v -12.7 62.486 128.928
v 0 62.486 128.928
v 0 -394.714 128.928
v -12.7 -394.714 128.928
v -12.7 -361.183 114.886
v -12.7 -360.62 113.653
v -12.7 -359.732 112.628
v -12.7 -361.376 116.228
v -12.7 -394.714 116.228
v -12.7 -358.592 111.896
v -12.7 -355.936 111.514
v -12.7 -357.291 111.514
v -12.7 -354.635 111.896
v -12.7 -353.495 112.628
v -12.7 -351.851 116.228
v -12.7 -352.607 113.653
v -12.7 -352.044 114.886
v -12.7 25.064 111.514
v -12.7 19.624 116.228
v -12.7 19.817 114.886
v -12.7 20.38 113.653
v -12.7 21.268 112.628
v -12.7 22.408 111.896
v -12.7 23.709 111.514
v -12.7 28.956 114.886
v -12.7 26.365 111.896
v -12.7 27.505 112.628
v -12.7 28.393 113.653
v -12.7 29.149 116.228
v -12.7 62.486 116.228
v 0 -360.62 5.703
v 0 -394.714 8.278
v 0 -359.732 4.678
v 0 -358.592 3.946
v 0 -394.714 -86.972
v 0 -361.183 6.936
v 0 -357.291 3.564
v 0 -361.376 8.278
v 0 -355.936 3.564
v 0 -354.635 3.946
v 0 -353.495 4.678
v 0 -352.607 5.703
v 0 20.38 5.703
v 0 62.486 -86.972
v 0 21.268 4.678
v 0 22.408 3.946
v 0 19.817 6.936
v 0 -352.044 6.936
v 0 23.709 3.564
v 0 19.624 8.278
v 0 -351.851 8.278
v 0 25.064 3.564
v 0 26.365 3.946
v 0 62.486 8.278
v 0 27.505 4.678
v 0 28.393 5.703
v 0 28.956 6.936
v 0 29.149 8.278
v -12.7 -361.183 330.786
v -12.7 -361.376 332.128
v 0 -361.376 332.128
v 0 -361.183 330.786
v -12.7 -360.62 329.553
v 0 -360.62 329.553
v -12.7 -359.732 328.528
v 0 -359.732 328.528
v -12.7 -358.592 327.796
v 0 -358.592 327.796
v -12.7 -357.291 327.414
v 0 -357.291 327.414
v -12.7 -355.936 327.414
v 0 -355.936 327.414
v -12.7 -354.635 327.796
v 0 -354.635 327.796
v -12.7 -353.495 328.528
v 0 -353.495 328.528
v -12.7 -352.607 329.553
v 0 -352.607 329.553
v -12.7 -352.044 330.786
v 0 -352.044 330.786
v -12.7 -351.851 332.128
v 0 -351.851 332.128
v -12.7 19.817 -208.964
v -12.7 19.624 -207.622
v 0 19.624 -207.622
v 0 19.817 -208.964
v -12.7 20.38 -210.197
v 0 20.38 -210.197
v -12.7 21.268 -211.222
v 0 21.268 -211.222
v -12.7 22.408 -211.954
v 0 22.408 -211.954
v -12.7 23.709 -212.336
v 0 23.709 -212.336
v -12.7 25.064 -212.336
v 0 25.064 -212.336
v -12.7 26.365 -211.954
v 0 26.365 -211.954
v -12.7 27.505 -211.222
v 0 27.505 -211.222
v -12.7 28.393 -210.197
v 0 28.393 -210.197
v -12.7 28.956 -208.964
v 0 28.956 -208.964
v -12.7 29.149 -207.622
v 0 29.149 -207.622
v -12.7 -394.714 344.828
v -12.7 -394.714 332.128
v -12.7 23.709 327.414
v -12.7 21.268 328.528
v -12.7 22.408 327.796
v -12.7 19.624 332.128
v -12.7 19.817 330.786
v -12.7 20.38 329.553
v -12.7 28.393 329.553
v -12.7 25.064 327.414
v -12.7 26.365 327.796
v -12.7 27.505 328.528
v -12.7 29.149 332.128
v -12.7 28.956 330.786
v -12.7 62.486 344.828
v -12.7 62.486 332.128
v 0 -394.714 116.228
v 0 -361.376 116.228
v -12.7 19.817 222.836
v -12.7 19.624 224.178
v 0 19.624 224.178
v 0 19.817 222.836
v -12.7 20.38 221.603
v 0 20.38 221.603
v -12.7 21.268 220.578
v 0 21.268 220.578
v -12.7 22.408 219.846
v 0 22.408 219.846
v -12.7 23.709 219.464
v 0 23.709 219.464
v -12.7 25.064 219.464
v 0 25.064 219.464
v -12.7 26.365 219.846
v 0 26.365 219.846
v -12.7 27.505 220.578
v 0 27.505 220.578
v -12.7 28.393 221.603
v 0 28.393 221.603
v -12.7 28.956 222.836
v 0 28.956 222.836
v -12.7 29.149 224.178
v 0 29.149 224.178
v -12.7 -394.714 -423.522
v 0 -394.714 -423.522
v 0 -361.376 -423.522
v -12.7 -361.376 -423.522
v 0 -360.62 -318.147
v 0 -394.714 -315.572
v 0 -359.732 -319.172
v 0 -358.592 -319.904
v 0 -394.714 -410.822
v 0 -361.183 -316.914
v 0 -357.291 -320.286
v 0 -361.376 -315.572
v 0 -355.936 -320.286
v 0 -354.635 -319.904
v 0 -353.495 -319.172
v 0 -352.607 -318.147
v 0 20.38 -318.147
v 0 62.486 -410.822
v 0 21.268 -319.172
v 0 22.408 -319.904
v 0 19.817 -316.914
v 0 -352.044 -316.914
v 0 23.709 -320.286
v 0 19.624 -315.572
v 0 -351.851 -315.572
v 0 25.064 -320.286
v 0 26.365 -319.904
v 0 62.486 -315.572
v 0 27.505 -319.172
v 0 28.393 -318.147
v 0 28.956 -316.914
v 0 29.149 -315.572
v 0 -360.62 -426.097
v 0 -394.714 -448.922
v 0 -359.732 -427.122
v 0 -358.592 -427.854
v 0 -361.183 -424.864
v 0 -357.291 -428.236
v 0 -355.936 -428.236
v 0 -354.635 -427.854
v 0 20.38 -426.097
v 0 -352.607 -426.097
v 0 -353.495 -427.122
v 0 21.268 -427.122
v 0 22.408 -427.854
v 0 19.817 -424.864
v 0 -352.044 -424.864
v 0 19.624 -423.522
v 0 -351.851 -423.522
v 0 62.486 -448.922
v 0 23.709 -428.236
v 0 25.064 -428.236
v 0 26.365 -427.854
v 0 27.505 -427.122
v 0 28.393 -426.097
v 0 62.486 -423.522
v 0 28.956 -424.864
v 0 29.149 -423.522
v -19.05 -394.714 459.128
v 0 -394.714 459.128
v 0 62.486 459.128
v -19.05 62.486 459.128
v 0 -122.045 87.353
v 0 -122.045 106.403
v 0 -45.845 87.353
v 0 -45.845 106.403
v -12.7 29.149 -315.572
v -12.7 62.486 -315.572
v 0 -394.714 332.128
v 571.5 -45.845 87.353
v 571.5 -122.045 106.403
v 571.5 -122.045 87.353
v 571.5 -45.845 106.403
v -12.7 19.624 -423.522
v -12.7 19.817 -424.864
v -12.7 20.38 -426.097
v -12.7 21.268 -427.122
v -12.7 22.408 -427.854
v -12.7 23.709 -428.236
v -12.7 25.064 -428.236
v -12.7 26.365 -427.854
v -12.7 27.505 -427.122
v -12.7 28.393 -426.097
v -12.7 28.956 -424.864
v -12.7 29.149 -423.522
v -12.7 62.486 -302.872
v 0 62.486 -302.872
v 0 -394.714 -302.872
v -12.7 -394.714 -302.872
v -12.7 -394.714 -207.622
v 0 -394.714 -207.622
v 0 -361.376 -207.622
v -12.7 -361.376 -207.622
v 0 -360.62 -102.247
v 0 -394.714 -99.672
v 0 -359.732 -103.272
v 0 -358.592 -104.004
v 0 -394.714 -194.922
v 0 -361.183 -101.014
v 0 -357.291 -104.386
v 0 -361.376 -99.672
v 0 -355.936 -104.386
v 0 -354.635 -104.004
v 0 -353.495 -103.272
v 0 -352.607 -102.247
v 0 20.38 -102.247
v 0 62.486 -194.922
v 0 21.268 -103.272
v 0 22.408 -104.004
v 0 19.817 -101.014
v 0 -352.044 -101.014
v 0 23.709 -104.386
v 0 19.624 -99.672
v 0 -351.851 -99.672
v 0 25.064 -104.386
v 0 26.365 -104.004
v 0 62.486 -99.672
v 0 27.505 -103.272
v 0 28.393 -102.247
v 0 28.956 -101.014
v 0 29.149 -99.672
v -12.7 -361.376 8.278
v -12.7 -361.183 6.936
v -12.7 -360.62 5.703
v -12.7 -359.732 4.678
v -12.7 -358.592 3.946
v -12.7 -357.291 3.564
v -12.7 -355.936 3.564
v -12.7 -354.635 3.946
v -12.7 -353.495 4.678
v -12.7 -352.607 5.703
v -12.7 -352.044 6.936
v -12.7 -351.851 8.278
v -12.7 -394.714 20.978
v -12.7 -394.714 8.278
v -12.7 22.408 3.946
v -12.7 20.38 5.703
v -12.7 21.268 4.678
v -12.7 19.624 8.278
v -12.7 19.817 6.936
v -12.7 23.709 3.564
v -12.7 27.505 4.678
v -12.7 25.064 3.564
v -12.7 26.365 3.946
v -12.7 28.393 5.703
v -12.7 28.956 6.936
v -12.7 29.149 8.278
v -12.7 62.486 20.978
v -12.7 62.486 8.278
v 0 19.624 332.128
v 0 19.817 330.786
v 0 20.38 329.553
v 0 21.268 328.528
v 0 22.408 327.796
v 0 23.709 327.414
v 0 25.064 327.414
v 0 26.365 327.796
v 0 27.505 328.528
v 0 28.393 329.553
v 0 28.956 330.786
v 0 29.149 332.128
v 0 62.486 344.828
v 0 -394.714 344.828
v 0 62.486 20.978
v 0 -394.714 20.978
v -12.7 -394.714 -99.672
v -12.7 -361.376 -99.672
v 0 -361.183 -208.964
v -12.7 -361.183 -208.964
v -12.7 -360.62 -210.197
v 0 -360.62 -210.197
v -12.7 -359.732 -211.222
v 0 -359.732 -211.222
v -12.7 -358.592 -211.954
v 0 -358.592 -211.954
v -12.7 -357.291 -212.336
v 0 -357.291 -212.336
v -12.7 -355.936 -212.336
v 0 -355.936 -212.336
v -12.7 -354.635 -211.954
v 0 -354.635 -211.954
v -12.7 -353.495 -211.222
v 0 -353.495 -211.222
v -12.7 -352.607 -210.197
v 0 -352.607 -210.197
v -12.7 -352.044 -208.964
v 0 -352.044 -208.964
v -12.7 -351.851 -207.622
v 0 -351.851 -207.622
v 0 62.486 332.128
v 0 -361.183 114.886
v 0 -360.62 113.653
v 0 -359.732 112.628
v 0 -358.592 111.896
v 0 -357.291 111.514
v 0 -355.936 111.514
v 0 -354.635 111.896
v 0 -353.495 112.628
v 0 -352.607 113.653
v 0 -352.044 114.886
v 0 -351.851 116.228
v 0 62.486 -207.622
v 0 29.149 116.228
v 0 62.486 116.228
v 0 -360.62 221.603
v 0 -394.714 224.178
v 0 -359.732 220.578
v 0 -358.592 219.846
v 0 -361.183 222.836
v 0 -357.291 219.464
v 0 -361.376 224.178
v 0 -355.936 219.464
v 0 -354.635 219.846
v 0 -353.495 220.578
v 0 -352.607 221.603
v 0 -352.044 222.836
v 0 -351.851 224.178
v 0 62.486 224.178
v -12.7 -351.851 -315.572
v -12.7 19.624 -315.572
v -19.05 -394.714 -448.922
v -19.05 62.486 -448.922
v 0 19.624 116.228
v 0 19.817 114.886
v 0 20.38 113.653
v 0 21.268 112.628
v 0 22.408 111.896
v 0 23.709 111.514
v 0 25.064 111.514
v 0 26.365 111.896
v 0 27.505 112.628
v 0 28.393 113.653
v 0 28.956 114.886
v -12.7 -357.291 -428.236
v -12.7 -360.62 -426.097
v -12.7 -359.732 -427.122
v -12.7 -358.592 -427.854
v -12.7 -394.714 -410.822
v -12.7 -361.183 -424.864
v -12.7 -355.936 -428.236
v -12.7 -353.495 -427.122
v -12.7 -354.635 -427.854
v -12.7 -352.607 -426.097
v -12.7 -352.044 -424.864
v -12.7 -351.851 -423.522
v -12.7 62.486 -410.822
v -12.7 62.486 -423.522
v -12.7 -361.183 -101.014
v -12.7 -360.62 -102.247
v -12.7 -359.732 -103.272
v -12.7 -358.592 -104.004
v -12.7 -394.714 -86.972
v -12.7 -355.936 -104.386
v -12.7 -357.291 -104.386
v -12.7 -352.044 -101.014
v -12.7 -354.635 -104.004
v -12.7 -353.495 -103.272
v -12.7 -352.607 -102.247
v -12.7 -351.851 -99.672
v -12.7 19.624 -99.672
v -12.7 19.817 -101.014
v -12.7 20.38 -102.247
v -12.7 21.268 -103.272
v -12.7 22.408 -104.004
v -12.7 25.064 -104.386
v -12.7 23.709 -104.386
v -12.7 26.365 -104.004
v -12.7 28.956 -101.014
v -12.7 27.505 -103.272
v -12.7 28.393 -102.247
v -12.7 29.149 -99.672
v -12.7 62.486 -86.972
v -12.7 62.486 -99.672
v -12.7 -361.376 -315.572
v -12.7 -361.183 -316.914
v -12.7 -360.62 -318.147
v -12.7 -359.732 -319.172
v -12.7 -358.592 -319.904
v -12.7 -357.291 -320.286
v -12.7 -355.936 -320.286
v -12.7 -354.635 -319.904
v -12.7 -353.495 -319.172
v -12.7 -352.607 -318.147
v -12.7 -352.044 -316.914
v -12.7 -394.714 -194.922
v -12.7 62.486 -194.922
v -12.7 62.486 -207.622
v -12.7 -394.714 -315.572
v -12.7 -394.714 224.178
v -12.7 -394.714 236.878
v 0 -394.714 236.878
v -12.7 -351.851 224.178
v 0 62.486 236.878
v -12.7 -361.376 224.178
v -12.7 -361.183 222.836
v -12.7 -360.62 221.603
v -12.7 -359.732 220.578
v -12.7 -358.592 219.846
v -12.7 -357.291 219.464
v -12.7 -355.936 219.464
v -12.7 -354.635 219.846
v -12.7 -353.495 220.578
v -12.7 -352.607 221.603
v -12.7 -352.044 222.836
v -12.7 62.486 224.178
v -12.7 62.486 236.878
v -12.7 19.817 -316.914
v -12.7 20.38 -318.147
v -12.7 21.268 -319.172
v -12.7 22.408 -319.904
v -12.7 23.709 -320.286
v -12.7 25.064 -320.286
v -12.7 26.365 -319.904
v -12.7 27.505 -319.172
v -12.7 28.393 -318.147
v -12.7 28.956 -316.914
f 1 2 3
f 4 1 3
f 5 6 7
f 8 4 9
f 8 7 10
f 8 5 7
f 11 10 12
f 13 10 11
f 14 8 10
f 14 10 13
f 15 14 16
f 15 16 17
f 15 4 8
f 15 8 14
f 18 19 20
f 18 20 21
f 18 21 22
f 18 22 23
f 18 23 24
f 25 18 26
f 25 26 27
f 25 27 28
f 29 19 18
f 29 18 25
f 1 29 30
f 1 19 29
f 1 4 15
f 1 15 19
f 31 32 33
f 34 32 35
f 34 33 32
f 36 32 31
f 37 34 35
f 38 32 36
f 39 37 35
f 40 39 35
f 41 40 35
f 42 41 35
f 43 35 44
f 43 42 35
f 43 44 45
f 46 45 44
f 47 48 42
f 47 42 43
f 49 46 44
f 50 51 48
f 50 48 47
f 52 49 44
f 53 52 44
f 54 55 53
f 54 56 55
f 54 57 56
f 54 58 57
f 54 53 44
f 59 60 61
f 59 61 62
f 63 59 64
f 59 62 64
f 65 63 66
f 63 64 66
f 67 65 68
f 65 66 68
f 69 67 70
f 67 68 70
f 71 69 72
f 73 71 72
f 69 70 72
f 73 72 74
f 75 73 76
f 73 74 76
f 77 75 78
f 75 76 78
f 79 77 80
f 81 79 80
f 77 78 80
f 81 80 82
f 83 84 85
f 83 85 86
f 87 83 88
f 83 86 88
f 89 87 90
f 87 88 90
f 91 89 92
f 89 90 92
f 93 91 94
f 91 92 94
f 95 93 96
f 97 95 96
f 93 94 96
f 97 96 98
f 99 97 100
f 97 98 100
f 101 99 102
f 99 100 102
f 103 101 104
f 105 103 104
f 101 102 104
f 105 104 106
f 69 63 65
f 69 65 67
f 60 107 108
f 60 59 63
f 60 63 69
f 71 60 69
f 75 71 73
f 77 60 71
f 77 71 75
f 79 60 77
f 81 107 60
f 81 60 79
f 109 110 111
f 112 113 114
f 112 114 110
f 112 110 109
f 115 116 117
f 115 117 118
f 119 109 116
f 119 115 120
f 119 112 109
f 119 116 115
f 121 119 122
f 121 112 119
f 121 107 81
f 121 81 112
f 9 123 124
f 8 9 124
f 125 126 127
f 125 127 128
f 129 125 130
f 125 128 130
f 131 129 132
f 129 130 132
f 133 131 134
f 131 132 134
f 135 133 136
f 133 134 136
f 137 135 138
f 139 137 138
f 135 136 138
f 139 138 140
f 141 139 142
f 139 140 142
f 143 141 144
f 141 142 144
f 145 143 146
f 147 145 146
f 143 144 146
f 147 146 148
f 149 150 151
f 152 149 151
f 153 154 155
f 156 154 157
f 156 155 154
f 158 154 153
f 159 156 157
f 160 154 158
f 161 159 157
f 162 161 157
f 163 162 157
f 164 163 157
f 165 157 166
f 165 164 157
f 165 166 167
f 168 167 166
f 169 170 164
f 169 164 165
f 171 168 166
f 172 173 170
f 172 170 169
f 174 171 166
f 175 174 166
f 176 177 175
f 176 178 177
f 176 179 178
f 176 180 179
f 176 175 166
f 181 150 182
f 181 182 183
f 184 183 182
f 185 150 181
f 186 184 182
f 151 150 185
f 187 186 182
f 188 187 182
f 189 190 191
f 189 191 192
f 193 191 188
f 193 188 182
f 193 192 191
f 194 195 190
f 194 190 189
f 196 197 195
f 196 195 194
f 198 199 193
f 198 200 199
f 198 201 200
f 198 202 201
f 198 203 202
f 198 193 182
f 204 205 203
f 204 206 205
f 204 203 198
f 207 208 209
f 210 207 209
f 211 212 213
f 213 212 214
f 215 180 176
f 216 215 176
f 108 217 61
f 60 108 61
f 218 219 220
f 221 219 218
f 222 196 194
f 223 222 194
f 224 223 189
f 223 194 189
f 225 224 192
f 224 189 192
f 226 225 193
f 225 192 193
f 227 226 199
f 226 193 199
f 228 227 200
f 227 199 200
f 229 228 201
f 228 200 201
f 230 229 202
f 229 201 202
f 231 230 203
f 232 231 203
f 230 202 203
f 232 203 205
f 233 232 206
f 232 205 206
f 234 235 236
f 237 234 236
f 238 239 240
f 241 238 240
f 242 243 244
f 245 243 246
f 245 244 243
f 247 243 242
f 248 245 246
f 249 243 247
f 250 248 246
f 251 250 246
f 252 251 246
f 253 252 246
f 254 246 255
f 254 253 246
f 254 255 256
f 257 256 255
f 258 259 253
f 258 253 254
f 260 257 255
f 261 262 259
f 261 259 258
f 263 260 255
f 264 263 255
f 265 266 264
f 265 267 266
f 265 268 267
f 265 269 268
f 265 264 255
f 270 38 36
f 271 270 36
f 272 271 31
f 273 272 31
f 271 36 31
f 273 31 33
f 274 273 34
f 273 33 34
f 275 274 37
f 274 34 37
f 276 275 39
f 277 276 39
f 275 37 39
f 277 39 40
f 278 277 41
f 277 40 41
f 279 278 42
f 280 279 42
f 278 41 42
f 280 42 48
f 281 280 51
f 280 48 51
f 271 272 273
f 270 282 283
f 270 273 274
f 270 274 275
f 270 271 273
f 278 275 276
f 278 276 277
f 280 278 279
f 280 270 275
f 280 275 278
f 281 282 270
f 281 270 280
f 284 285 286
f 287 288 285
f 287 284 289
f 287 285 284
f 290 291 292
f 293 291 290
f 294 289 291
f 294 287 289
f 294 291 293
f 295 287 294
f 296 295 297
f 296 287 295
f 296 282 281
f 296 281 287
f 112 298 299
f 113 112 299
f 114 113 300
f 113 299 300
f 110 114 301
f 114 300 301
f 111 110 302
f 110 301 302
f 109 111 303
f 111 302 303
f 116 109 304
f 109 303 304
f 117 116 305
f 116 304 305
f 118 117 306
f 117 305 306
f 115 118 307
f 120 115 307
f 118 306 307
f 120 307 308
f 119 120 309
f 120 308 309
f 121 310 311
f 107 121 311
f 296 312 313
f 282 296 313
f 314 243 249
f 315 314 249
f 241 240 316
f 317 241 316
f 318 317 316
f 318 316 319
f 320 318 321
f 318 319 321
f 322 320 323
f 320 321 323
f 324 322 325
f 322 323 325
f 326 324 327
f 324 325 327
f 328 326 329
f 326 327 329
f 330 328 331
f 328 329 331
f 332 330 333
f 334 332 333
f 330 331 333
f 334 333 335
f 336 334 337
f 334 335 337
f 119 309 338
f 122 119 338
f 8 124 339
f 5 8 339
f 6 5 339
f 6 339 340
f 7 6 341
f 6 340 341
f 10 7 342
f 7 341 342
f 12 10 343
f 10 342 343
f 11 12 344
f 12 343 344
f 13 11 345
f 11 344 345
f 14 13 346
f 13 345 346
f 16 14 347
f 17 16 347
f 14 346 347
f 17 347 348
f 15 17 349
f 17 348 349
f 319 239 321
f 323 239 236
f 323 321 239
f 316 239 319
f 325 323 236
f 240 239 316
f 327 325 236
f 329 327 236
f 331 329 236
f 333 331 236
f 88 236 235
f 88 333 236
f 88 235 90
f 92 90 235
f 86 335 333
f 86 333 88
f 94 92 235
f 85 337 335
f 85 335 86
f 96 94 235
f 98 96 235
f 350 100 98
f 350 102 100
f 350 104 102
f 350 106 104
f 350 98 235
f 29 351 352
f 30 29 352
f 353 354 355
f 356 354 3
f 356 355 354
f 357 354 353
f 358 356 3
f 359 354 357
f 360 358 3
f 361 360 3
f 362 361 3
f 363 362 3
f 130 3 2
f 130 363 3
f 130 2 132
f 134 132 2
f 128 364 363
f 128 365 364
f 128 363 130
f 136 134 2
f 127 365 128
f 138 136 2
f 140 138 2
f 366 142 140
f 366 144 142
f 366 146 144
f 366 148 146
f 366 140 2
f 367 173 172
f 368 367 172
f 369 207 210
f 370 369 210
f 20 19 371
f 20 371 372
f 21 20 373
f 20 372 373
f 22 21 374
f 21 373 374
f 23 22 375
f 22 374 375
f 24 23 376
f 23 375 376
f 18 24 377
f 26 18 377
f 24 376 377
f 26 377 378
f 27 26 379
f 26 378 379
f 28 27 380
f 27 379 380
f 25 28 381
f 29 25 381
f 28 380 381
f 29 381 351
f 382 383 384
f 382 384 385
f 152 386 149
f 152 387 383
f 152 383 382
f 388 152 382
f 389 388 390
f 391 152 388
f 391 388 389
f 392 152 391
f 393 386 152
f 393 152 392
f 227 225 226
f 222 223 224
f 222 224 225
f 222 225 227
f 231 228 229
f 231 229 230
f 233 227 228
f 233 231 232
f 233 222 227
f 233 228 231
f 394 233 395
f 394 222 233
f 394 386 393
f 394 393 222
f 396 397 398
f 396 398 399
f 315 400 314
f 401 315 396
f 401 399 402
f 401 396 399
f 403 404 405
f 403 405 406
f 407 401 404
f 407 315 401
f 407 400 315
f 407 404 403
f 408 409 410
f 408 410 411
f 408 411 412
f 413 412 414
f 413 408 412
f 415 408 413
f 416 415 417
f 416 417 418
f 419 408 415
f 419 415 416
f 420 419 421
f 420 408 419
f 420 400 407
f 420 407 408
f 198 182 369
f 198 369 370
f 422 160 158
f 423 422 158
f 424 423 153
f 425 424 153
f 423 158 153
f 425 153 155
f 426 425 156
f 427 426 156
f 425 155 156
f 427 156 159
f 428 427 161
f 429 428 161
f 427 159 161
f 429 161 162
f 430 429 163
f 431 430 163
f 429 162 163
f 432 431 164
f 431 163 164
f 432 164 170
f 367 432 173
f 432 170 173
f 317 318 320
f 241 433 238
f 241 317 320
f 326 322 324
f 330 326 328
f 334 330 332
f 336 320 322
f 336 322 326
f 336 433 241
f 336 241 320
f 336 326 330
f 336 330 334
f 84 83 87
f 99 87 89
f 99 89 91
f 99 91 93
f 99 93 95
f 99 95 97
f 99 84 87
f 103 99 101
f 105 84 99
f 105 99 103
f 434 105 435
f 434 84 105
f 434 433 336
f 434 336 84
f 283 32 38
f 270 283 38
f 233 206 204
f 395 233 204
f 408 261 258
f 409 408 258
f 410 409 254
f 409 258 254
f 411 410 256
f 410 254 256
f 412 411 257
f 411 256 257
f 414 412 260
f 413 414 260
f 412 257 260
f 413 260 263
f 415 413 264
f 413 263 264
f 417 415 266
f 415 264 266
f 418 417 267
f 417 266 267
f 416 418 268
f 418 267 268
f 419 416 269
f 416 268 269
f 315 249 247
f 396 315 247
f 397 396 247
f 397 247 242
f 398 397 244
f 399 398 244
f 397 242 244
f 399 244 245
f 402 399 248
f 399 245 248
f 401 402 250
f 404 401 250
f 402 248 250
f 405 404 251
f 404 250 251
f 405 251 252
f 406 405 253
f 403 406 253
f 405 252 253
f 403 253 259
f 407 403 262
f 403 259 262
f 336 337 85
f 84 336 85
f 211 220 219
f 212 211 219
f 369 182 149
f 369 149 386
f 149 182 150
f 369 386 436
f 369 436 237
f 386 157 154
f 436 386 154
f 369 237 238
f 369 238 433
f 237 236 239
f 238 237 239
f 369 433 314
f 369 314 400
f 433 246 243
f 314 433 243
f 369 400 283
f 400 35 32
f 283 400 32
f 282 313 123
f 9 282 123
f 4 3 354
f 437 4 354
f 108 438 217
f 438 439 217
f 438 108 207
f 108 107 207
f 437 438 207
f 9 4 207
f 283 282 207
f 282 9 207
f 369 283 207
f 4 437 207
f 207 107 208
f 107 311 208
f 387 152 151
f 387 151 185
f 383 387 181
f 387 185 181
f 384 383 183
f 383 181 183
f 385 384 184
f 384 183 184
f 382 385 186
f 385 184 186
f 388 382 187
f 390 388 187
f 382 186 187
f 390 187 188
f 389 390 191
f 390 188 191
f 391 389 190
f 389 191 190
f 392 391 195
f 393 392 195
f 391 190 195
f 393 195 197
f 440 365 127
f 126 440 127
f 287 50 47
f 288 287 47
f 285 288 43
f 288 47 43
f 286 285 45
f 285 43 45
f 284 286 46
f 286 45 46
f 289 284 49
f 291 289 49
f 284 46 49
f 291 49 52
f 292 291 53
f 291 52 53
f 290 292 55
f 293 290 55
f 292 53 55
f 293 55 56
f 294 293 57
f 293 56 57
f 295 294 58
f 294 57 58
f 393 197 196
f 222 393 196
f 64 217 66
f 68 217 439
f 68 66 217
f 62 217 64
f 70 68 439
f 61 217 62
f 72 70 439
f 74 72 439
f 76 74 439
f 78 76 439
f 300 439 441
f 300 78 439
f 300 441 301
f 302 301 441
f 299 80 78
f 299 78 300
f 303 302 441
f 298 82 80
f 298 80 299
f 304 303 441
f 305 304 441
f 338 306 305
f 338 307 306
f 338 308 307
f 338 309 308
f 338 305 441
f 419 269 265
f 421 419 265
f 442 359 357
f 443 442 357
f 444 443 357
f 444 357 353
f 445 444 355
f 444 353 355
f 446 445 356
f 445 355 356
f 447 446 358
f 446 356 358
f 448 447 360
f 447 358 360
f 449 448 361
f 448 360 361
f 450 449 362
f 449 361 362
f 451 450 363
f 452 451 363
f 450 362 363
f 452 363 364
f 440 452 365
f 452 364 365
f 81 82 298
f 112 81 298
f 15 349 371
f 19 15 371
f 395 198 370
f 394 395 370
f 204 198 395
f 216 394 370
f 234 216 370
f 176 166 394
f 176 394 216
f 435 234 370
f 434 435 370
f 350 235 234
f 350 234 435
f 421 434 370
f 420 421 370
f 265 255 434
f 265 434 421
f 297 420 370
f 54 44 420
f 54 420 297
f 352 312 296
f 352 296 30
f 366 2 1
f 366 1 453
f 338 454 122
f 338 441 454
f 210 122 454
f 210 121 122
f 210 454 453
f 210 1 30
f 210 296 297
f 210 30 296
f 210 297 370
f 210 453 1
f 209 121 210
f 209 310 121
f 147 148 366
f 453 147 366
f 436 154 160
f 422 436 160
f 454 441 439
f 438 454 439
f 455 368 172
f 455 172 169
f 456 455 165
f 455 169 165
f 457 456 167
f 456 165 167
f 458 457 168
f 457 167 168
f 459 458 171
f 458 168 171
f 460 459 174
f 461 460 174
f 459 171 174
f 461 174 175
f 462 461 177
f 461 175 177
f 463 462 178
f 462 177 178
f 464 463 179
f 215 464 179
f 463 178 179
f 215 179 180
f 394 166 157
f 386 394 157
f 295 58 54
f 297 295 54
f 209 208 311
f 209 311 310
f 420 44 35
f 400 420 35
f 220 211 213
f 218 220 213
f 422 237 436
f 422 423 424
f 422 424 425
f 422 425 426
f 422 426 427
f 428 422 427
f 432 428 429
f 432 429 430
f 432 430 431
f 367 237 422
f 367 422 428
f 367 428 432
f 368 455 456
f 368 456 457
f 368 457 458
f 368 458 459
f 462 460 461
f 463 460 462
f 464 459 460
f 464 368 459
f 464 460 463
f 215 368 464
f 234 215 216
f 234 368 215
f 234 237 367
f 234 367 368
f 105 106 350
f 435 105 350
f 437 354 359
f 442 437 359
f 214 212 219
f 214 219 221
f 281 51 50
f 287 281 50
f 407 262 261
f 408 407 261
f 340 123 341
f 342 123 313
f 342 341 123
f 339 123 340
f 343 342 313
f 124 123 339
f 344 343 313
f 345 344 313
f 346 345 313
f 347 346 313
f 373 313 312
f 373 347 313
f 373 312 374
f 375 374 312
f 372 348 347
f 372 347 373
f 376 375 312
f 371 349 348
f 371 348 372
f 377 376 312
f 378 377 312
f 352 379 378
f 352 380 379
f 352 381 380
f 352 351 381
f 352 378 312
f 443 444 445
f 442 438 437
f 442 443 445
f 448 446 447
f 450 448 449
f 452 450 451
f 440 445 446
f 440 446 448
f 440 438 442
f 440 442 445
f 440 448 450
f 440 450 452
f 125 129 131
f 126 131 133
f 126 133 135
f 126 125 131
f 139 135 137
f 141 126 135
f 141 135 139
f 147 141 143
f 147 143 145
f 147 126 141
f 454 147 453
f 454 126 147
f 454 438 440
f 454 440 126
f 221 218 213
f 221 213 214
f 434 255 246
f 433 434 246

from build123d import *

# Parameters (mm, degrees)
F0_W     = 457.2
F0_H     = 908.05
F2_DEPTH = 19.05
F3_DEPTH = 12.7
F4_DEPTH = 12.7
F5_W     = 76.2
F5_H     = 19.05
F6_DEPTH = 571.5


with BuildPart() as f2:
    # F0 (on Right) → F2 (new body)
    with BuildSketch(Plane.YZ):
        with Locations((-166.1135266319, 5.1027350128)):
            Rectangle(F0_W, F0_H)
    extrude(amount=-F2_DEPTH)

    # F1 (on face) → F3 (cut)
    with BuildSketch(Plane.YZ):
        with BuildLine():
            Line((-394.7135266319, -410.8222649872), (-394.7135266319, -423.5222649872))
            Line((-394.7135266319, -423.5222649872), (-361.3760266319, -423.5222649872))
            ThreePointArc((-361.3760266319, -423.5222649872), (-356.6135266319, -428.2847649872), (-351.8510266319, -423.5222649872))
            Line((-351.8510266319, -423.5222649872), (19.6239733681, -423.5222649872))
            ThreePointArc((19.6239733681, -423.5222649872), (24.3864733681, -428.2847649872), (29.1489733681, -423.5222649872))
            Line((29.1489733681, -423.5222649872), (62.4864733681, -423.5222649872))
            Line((62.4864733681, -423.5222649872), (62.4864733681, -410.8222649872))
            Line((62.4864733681, -410.8222649872), (-394.7135266319, -410.8222649872))
        make_face()
    extrude(amount=-F3_DEPTH, mode=Mode.SUBTRACT)

    # F1 (on face) → F4 (cut)
    with BuildSketch(Plane.YZ):
        with BuildLine():
            Line((-394.7135266319, -302.8722649872), (-394.7135266319, -315.5722649872))
            Line((-394.7135266319, -315.5722649872), (-361.3760266319, -315.5722649872))
            ThreePointArc((-361.3760266319, -315.5722649872), (-356.6135266319, -320.3347649872), (-351.8510266319, -315.5722649872))
            Line((-351.8510266319, -315.5722649872), (19.6239733681, -315.5722649872))
            ThreePointArc((19.6239733681, -315.5722649872), (24.3864733681, -320.3347649872), (29.1489733681, -315.5722649872))
            Line((29.1489733681, -315.5722649872), (62.4864733681, -315.5722649872))
            Line((62.4864733681, -315.5722649872), (62.4864733681, -302.8722649872))
            Line((62.4864733681, -302.8722649872), (-394.7135266319, -302.8722649872))
        make_face()
        with BuildLine():
            Line((-394.7135266319, -194.9222649872), (-394.7135266319, -207.6222649872))
            Line((-394.7135266319, -207.6222649872), (-361.3760266319, -207.6222649872))
            ThreePointArc((-361.3760266319, -207.6222649872), (-356.6135266319, -212.3847649872), (-351.8510266319, -207.6222649872))
            Line((-351.8510266319, -207.6222649872), (19.6239733681, -207.6222649872))
            ThreePointArc((19.6239733681, -207.6222649872), (24.3864733681, -212.3847649872), (29.1489733681, -207.6222649872))
            Line((29.1489733681, -207.6222649872), (62.4864733681, -207.6222649872))
            Line((62.4864733681, -207.6222649872), (62.4864733681, -194.9222649872))
            Line((62.4864733681, -194.9222649872), (-394.7135266319, -194.9222649872))
        make_face()
        with BuildLine():
            Line((-394.7135266319, -86.9722649872), (-394.7135266319, -99.6722649872))
            Line((-394.7135266319, -99.6722649872), (-361.3760266319, -99.6722649872))
            ThreePointArc((-361.3760266319, -99.6722649872), (-356.6135266319, -104.4347649872), (-351.8510266319, -99.6722649872))
            Line((-351.8510266319, -99.6722649872), (19.6239733681, -99.6722649872))
            ThreePointArc((19.6239733681, -99.6722649872), (24.3864733681, -104.4347649872), (29.1489733681, -99.6722649872))
            Line((29.1489733681, -99.6722649872), (62.4864733681, -99.6722649872))
            Line((62.4864733681, -99.6722649872), (62.4864733681, -86.9722649872))
            Line((62.4864733681, -86.9722649872), (-394.7135266319, -86.9722649872))
        make_face()
        with BuildLine():
            Line((-394.7135266319, 20.9777350128), (-394.7135266319, 8.2777350128))
            Line((-394.7135266319, 8.2777350128), (-361.3760266319, 8.2777350128))
            ThreePointArc((-361.3760266319, 8.2777350128), (-356.6135266319, 3.5152350128), (-351.8510266319, 8.2777350128))
            Line((-351.8510266319, 8.2777350128), (19.6239733681, 8.2777350128))
            ThreePointArc((19.6239733681, 8.2777350128), (24.3864733681, 3.5152350128), (29.1489733681, 8.2777350128))
            Line((29.1489733681, 8.2777350128), (62.4864733681, 8.2777350128))
            Line((62.4864733681, 8.2777350128), (62.4864733681, 20.9777350128))
            Line((62.4864733681, 20.9777350128), (-394.7135266319, 20.9777350128))
        make_face()
        with BuildLine():
            Line((-394.7135266319, 128.9277350128), (-394.7135266319, 116.2277350128))
            Line((-394.7135266319, 116.2277350128), (-361.3760266319, 116.2277350128))
            ThreePointArc((-361.3760266319, 116.2277350128), (-356.6135266319, 111.4652350128), (-351.8510266319, 116.2277350128))
            Line((-351.8510266319, 116.2277350128), (19.6239733681, 116.2277350128))
            ThreePointArc((19.6239733681, 116.2277350128), (24.3864733681, 111.4652350128), (29.1489733681, 116.2277350128))
            Line((29.1489733681, 116.2277350128), (62.4864733681, 116.2277350128))
            Line((62.4864733681, 116.2277350128), (62.4864733681, 128.9277350128))
            Line((62.4864733681, 128.9277350128), (-394.7135266319, 128.9277350128))
        make_face()
        with BuildLine():
            Line((-394.7135266319, 236.8777350128), (-394.7135266319, 224.1777350128))
            Line((-394.7135266319, 224.1777350128), (-361.3760266319, 224.1777350128))
            ThreePointArc((-361.3760266319, 224.1777350128), (-356.6135266319, 219.4152350128), (-351.8510266319, 224.1777350128))
            Line((-351.8510266319, 224.1777350128), (19.6239733681, 224.1777350128))
            ThreePointArc((19.6239733681, 224.1777350128), (24.3864733681, 219.4152350128), (29.1489733681, 224.1777350128))
            Line((29.1489733681, 224.1777350128), (62.4864733681, 224.1777350128))
            Line((62.4864733681, 224.1777350128), (62.4864733681, 236.8777350128))
            Line((62.4864733681, 236.8777350128), (-394.7135266319, 236.8777350128))
        make_face()
        with BuildLine():
            Line((-394.7135266319, 344.8277350128), (-394.7135266319, 332.1277350128))
            Line((-394.7135266319, 332.1277350128), (-361.3760266319, 332.1277350128))
            ThreePointArc((-361.3760266319, 332.1277350128), (-356.6135266319, 327.3652350128), (-351.8510266319, 332.1277350128))
            Line((-351.8510266319, 332.1277350128), (19.6239733681, 332.1277350128))
            ThreePointArc((19.6239733681, 332.1277350128), (24.3864733681, 327.3652350128), (29.1489733681, 332.1277350128))
            Line((29.1489733681, 332.1277350128), (62.4864733681, 332.1277350128))
            Line((62.4864733681, 332.1277350128), (62.4864733681, 344.8277350128))
            Line((62.4864733681, 344.8277350128), (-394.7135266319, 344.8277350128))
        make_face()
    extrude(amount=-F4_DEPTH, mode=Mode.SUBTRACT)


with BuildPart() as f6:
    # F5 (on Right) → F6 (new body)
    with BuildSketch(Plane.YZ):
        with Locations((-83.9446932077, 96.8780869972)):
            Rectangle(F5_W, F5_H)
    extrude(amount=F6_DEPTH)


solid = Compound([f2.part, f6.part])
